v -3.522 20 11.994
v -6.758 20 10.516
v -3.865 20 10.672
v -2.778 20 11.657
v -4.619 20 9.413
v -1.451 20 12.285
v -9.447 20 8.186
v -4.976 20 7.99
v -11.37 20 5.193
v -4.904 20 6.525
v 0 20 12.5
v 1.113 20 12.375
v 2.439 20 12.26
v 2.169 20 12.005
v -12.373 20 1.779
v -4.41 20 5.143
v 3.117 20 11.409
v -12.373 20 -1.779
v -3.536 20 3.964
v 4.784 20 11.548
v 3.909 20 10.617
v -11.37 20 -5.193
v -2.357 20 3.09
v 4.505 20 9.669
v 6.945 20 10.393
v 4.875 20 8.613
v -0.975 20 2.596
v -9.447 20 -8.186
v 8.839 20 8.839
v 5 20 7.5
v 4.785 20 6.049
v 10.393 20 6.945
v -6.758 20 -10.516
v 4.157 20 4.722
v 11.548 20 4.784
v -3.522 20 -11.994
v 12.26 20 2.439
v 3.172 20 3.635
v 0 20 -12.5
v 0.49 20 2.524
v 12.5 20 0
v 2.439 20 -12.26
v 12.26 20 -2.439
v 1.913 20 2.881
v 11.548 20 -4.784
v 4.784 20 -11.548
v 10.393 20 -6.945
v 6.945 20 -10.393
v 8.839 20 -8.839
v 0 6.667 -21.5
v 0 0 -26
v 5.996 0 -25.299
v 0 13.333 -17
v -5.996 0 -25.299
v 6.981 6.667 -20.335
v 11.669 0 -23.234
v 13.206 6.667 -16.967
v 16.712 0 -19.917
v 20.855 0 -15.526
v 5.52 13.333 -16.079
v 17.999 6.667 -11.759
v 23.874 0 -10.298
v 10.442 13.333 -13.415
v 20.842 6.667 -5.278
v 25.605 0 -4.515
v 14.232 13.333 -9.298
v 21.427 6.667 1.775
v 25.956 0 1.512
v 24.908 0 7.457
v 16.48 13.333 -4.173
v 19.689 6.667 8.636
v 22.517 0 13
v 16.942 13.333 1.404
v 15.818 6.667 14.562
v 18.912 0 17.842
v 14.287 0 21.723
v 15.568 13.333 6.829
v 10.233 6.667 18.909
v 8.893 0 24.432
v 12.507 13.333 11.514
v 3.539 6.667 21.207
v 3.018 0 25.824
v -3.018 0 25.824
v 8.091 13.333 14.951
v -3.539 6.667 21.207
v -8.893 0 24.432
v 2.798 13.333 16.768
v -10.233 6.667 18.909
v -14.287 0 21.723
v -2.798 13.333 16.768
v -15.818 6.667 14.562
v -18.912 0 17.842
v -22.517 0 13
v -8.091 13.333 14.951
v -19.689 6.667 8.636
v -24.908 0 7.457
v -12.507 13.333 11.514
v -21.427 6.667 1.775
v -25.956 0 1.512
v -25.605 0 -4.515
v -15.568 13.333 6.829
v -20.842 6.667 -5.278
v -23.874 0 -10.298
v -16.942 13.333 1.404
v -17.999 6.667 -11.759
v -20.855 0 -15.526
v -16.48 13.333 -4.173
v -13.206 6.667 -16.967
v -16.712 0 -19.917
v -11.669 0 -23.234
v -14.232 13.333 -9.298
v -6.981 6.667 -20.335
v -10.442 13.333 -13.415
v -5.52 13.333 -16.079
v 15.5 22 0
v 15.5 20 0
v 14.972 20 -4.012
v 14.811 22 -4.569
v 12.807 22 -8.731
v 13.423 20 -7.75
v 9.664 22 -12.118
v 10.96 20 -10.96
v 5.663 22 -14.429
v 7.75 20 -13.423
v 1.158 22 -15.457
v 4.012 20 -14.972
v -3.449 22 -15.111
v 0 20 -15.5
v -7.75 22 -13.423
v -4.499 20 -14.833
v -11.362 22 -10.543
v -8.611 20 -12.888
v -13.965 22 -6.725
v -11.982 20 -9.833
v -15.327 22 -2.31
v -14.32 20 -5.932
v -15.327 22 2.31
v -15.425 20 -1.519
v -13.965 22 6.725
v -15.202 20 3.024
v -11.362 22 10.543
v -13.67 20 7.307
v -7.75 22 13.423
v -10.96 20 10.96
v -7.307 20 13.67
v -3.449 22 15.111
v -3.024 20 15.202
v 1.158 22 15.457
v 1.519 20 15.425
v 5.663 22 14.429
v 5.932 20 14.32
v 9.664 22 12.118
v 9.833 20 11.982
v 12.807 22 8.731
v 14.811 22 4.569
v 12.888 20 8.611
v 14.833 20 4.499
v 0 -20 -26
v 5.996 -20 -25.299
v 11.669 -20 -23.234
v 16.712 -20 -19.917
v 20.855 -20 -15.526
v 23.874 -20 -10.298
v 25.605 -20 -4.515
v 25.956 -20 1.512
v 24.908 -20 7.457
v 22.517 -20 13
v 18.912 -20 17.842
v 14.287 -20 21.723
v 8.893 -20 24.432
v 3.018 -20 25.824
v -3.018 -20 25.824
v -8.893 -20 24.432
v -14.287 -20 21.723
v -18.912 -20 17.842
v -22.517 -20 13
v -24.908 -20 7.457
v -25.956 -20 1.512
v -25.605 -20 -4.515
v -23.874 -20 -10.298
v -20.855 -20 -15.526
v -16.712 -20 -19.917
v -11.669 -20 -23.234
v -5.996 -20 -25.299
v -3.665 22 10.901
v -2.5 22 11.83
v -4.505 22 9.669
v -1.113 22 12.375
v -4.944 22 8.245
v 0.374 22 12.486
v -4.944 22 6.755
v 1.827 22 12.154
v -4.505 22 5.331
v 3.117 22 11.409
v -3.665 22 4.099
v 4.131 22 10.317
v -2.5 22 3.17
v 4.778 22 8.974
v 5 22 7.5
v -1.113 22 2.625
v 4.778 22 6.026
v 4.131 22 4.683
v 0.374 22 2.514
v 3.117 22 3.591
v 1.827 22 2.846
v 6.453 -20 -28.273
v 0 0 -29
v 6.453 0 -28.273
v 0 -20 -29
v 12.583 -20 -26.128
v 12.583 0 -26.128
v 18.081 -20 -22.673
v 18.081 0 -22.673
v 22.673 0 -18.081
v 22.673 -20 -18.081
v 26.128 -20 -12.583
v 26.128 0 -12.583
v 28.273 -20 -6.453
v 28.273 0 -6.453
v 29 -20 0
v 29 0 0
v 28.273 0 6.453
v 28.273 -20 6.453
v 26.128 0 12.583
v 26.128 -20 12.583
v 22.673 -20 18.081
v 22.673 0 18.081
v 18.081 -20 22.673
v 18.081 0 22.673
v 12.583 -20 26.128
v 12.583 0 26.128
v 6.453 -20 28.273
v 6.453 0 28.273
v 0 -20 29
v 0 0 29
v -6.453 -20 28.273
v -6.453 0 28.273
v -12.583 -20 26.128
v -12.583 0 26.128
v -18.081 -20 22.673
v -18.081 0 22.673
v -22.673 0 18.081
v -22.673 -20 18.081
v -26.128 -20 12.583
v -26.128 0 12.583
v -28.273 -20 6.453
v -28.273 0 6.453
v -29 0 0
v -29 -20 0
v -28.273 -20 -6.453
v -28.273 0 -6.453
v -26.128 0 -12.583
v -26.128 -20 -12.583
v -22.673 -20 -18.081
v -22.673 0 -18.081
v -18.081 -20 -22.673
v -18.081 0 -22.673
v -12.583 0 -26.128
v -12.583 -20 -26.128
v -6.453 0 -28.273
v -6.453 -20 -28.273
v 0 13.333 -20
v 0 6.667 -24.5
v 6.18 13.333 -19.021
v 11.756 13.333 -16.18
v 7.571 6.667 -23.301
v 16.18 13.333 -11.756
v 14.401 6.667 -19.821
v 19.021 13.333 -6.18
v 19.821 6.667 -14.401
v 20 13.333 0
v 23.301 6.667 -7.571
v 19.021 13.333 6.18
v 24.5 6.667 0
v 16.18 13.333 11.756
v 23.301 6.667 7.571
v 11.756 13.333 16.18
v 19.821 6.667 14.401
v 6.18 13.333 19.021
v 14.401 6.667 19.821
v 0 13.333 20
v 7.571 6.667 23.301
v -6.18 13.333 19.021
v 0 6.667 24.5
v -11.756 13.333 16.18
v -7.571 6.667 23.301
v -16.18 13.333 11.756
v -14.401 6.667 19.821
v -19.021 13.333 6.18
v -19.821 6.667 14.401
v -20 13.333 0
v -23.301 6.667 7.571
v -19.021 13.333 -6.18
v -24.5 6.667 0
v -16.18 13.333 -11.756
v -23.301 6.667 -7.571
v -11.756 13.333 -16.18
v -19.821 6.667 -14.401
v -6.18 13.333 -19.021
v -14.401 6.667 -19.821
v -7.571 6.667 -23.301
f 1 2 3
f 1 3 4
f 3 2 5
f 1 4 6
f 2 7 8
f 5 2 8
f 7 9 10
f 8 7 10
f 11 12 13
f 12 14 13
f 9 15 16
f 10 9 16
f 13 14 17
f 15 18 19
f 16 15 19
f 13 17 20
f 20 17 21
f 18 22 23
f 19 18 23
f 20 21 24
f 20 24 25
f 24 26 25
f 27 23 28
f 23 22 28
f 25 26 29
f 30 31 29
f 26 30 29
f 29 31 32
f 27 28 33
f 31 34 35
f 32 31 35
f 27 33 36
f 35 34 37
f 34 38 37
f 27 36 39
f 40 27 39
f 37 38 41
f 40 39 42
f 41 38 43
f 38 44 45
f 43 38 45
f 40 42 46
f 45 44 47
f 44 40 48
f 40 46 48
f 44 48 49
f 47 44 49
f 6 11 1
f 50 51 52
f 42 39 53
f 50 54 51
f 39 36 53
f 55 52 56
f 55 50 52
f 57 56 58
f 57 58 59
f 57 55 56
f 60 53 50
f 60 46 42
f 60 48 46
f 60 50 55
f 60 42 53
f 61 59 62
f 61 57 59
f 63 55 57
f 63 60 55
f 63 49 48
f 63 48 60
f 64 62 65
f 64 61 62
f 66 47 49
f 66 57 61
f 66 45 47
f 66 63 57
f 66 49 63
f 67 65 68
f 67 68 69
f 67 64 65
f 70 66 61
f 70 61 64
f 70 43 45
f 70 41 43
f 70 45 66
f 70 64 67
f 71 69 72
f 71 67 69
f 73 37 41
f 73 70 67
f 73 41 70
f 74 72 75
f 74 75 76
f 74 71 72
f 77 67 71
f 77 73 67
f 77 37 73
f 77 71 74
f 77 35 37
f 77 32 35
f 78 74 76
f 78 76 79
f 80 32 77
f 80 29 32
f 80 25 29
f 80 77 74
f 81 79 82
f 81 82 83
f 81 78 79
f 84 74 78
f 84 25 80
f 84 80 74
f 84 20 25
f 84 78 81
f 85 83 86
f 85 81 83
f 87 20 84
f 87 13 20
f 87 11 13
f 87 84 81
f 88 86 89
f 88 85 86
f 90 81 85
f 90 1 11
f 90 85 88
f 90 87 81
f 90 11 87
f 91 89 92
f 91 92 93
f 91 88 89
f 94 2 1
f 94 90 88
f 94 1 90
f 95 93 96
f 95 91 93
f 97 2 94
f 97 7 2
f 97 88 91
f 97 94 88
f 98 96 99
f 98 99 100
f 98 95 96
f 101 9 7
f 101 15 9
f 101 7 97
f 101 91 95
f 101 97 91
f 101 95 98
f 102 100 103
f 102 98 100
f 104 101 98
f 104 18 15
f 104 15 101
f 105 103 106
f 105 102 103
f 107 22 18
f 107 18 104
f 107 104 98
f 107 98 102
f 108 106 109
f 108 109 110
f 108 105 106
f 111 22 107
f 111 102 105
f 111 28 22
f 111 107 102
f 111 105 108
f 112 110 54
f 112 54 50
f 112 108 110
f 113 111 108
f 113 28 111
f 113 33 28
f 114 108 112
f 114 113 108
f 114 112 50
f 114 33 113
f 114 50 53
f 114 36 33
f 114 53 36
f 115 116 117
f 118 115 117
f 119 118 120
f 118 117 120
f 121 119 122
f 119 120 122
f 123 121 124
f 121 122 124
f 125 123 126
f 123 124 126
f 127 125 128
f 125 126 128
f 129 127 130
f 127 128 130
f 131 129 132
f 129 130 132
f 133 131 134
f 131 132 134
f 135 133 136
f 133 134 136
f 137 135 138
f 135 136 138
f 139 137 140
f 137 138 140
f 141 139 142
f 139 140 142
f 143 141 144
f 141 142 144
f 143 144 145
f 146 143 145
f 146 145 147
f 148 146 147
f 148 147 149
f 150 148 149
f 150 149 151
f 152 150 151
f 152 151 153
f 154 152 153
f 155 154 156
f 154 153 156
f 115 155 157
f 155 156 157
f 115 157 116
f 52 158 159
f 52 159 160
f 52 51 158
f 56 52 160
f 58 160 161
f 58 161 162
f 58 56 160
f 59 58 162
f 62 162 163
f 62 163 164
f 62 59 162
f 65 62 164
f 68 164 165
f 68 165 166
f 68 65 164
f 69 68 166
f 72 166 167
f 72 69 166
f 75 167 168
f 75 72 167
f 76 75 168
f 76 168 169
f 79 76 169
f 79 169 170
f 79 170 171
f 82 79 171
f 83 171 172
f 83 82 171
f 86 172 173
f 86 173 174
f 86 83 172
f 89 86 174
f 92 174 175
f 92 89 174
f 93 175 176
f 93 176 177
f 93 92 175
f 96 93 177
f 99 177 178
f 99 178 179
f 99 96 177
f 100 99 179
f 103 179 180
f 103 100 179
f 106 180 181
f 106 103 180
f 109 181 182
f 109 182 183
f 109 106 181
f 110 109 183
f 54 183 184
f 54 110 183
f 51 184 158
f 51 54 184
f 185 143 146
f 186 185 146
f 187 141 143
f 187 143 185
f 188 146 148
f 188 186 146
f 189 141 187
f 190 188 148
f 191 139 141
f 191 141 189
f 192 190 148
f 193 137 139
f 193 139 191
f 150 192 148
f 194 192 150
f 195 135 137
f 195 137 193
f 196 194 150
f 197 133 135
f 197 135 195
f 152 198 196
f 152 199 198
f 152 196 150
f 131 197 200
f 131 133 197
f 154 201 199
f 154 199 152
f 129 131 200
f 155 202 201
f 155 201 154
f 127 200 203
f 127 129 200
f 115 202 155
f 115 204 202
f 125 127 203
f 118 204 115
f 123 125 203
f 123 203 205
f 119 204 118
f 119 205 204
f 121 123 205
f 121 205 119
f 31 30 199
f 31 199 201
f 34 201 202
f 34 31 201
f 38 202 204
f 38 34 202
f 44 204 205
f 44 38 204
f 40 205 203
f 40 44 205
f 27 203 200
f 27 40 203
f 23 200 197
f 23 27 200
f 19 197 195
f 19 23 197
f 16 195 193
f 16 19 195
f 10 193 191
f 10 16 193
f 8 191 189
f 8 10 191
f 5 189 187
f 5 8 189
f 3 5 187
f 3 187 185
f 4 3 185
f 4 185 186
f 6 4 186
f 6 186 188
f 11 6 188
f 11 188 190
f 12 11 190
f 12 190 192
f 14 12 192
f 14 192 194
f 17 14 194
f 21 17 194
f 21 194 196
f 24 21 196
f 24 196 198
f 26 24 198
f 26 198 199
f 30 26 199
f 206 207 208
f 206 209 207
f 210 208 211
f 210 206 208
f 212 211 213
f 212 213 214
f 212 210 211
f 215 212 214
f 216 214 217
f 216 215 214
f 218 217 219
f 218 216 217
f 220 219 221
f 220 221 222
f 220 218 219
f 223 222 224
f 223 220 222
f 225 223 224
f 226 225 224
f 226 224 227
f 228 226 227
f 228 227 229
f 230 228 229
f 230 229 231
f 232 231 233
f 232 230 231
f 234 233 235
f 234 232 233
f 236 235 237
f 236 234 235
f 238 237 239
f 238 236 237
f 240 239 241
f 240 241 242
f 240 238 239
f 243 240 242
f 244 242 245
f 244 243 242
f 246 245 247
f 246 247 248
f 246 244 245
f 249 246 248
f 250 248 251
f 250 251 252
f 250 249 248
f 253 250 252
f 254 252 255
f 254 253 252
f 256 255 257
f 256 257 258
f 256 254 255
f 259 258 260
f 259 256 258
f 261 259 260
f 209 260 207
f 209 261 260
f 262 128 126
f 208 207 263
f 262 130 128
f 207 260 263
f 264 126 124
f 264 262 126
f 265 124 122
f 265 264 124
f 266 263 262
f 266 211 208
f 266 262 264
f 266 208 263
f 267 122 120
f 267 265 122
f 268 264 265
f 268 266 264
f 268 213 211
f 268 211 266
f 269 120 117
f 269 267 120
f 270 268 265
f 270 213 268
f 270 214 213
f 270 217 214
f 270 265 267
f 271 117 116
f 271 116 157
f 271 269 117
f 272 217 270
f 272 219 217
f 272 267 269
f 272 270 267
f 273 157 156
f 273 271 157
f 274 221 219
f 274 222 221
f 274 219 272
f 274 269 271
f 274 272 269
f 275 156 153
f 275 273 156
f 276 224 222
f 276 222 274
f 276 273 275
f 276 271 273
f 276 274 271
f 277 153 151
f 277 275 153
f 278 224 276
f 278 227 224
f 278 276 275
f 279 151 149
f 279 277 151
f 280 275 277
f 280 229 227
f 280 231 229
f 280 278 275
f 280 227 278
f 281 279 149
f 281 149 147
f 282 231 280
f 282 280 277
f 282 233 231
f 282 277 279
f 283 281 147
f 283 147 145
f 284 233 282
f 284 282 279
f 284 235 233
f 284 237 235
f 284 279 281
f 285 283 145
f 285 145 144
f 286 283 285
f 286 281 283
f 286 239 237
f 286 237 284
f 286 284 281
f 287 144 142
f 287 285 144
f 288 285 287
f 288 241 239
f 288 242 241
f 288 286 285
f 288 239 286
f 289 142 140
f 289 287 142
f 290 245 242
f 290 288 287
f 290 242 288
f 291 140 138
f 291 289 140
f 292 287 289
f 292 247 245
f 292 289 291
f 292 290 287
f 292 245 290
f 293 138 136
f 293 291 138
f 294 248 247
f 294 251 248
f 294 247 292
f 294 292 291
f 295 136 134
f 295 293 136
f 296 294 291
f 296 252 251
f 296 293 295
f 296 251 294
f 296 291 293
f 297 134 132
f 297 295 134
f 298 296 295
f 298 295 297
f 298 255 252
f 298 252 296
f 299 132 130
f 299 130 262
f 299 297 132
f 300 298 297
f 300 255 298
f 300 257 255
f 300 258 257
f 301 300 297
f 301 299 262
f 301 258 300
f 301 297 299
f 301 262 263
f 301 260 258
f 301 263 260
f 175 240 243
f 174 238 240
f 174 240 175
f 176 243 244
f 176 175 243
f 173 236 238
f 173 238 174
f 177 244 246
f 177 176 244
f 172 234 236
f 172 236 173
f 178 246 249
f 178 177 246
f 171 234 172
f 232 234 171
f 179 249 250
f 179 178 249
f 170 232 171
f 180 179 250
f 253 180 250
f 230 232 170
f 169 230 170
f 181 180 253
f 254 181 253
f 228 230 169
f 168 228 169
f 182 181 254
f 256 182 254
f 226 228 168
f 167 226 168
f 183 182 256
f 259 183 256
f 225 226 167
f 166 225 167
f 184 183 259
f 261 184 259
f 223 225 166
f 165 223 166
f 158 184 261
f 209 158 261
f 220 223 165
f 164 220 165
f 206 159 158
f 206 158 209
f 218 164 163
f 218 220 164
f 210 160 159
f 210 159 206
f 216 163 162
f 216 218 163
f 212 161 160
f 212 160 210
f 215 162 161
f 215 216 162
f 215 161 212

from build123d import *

# Parameters (mm, degrees)
IZIM6_R                     = 15.5
IZIM6_R_2                   = 5
Y_KSEKLIK_EKSTR_ZYON2_DEPTH = 2


with BuildPart() as part:
    # Çizim5 → Döndür1 (revolve)
    with BuildSketch(Plane(origin=(0, 0, 0), x_dir=(0, 0, -1), z_dir=(1, 0, 0))):
        Polygon((12.5, 20), (15.5, 20), (29, 0), (29, -20), (26, -20), (26, 0), align=None)
    revolve(axis=Axis((0, 40.284256648, 0), (0, -1, 0)))

    # Çizim6 → Yükseklik-Ekstrüzyon2 (add)
    with BuildSketch(Plane(origin=(0, 20, 0), x_dir=(1, 0, 0), z_dir=(0, 1, 0))):
        Circle(IZIM6_R)
        with Locations((0, -7.5)):
            Circle(IZIM6_R_2, mode=Mode.SUBTRACT)
    extrude(amount=Y_KSEKLIK_EKSTR_ZYON2_DEPTH)


solid = part.part
